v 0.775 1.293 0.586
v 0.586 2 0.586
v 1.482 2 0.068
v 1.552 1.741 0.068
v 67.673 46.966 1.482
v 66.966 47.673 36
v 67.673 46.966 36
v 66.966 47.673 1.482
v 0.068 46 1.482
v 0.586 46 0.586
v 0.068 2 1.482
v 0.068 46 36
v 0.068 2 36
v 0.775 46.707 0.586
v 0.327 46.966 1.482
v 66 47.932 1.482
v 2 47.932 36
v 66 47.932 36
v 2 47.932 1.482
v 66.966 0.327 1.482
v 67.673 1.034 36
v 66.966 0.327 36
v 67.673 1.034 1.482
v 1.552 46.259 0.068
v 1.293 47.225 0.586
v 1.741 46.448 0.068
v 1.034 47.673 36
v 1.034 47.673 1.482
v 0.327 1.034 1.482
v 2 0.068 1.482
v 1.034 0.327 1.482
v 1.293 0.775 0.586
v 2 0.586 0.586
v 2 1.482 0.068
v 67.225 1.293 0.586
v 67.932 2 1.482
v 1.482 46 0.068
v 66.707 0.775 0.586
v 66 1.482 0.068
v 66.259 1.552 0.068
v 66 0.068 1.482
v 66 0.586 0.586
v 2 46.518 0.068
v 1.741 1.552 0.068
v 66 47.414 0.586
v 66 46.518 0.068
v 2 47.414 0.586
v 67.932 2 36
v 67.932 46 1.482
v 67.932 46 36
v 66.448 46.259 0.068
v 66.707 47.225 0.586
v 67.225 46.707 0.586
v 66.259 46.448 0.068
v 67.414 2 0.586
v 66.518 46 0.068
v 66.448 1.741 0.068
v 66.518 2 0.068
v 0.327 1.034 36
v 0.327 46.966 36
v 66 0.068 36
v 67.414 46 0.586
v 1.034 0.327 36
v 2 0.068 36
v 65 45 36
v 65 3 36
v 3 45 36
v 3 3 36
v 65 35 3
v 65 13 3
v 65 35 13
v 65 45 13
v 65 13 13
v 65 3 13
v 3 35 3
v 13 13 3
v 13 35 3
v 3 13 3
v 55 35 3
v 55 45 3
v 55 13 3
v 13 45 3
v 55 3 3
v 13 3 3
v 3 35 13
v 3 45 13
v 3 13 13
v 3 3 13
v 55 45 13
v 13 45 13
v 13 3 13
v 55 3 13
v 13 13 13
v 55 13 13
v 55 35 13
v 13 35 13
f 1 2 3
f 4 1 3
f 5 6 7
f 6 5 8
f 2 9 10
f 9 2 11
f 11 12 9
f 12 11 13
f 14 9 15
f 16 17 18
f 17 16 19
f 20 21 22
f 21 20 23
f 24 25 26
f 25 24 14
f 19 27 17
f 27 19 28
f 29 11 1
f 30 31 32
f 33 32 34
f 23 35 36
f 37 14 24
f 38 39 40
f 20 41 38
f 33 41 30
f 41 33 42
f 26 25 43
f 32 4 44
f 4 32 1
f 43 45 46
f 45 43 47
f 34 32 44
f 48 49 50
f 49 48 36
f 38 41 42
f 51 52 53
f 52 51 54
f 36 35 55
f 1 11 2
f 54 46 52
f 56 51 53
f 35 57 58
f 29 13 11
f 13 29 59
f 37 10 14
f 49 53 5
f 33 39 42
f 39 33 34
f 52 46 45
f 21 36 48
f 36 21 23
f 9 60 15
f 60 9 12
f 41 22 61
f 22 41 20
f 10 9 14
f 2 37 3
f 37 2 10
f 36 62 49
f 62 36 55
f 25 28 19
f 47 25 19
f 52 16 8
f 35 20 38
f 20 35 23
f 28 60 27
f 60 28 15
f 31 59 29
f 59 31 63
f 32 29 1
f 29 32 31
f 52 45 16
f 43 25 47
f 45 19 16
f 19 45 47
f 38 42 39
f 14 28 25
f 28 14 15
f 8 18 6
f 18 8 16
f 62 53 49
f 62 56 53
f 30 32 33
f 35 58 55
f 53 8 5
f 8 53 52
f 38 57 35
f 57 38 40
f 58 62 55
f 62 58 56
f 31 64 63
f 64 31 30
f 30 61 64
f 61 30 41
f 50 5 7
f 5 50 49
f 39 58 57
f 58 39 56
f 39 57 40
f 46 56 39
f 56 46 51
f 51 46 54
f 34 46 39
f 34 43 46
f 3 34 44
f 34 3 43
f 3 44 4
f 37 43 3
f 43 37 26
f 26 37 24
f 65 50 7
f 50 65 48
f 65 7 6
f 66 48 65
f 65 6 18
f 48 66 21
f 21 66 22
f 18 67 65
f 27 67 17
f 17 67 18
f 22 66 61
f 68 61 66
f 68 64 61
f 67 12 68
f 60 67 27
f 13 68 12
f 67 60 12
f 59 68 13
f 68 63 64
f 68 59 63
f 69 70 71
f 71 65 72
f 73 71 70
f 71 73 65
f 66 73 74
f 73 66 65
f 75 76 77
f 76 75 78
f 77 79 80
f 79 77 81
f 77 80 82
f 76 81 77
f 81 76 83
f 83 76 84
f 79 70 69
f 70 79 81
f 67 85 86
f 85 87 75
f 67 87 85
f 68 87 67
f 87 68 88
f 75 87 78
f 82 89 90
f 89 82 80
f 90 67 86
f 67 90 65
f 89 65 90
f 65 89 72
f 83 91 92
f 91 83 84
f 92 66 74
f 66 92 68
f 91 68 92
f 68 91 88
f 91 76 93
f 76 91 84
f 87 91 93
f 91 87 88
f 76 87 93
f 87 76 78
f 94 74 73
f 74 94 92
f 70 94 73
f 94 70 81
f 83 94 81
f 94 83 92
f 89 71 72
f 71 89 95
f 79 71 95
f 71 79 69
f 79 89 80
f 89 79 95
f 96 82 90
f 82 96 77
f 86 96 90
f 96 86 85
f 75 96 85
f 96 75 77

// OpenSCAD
union() {
	difference() {
		difference() {
			minkowski() {
				translate(v = [2, 2, 2]) {
					cube(size = [64.0000000000, 44.0000000000, 34.0000000000]);
				}
				sphere($fn = 12, r = 2);
			}
			translate(v = [0, 0, 36.0000000000]) {
				cube(size = [68.0000000000, 48.0000000000, 3]);
			}
		}
		translate(v = [3, 3, 3]) {
			cube(size = [62.0000000000, 42.0000000000, 34.0000000000]);
		}
	}
	translate(v = [3, 3, 3]) {
		cube(size = [10, 10, 10]);
	}
	translate(v = [65.0000000000, 3, 3]) {
		scale(v = [-1, 1, 1]) {
			cube(size = [10, 10, 10]);
		}
	}
	translate(v = [65.0000000000, 45.0000000000, 3]) {
		scale(v = [1, -1, 1]) {
			scale(v = [-1, 1, 1]) {
				cube(size = [10, 10, 10]);
			}
		}
	}
	translate(v = [3, 45.0000000000, 3]) {
		scale(v = [1, -1, 1]) {
			cube(size = [10, 10, 10]);
		}
	}
}
